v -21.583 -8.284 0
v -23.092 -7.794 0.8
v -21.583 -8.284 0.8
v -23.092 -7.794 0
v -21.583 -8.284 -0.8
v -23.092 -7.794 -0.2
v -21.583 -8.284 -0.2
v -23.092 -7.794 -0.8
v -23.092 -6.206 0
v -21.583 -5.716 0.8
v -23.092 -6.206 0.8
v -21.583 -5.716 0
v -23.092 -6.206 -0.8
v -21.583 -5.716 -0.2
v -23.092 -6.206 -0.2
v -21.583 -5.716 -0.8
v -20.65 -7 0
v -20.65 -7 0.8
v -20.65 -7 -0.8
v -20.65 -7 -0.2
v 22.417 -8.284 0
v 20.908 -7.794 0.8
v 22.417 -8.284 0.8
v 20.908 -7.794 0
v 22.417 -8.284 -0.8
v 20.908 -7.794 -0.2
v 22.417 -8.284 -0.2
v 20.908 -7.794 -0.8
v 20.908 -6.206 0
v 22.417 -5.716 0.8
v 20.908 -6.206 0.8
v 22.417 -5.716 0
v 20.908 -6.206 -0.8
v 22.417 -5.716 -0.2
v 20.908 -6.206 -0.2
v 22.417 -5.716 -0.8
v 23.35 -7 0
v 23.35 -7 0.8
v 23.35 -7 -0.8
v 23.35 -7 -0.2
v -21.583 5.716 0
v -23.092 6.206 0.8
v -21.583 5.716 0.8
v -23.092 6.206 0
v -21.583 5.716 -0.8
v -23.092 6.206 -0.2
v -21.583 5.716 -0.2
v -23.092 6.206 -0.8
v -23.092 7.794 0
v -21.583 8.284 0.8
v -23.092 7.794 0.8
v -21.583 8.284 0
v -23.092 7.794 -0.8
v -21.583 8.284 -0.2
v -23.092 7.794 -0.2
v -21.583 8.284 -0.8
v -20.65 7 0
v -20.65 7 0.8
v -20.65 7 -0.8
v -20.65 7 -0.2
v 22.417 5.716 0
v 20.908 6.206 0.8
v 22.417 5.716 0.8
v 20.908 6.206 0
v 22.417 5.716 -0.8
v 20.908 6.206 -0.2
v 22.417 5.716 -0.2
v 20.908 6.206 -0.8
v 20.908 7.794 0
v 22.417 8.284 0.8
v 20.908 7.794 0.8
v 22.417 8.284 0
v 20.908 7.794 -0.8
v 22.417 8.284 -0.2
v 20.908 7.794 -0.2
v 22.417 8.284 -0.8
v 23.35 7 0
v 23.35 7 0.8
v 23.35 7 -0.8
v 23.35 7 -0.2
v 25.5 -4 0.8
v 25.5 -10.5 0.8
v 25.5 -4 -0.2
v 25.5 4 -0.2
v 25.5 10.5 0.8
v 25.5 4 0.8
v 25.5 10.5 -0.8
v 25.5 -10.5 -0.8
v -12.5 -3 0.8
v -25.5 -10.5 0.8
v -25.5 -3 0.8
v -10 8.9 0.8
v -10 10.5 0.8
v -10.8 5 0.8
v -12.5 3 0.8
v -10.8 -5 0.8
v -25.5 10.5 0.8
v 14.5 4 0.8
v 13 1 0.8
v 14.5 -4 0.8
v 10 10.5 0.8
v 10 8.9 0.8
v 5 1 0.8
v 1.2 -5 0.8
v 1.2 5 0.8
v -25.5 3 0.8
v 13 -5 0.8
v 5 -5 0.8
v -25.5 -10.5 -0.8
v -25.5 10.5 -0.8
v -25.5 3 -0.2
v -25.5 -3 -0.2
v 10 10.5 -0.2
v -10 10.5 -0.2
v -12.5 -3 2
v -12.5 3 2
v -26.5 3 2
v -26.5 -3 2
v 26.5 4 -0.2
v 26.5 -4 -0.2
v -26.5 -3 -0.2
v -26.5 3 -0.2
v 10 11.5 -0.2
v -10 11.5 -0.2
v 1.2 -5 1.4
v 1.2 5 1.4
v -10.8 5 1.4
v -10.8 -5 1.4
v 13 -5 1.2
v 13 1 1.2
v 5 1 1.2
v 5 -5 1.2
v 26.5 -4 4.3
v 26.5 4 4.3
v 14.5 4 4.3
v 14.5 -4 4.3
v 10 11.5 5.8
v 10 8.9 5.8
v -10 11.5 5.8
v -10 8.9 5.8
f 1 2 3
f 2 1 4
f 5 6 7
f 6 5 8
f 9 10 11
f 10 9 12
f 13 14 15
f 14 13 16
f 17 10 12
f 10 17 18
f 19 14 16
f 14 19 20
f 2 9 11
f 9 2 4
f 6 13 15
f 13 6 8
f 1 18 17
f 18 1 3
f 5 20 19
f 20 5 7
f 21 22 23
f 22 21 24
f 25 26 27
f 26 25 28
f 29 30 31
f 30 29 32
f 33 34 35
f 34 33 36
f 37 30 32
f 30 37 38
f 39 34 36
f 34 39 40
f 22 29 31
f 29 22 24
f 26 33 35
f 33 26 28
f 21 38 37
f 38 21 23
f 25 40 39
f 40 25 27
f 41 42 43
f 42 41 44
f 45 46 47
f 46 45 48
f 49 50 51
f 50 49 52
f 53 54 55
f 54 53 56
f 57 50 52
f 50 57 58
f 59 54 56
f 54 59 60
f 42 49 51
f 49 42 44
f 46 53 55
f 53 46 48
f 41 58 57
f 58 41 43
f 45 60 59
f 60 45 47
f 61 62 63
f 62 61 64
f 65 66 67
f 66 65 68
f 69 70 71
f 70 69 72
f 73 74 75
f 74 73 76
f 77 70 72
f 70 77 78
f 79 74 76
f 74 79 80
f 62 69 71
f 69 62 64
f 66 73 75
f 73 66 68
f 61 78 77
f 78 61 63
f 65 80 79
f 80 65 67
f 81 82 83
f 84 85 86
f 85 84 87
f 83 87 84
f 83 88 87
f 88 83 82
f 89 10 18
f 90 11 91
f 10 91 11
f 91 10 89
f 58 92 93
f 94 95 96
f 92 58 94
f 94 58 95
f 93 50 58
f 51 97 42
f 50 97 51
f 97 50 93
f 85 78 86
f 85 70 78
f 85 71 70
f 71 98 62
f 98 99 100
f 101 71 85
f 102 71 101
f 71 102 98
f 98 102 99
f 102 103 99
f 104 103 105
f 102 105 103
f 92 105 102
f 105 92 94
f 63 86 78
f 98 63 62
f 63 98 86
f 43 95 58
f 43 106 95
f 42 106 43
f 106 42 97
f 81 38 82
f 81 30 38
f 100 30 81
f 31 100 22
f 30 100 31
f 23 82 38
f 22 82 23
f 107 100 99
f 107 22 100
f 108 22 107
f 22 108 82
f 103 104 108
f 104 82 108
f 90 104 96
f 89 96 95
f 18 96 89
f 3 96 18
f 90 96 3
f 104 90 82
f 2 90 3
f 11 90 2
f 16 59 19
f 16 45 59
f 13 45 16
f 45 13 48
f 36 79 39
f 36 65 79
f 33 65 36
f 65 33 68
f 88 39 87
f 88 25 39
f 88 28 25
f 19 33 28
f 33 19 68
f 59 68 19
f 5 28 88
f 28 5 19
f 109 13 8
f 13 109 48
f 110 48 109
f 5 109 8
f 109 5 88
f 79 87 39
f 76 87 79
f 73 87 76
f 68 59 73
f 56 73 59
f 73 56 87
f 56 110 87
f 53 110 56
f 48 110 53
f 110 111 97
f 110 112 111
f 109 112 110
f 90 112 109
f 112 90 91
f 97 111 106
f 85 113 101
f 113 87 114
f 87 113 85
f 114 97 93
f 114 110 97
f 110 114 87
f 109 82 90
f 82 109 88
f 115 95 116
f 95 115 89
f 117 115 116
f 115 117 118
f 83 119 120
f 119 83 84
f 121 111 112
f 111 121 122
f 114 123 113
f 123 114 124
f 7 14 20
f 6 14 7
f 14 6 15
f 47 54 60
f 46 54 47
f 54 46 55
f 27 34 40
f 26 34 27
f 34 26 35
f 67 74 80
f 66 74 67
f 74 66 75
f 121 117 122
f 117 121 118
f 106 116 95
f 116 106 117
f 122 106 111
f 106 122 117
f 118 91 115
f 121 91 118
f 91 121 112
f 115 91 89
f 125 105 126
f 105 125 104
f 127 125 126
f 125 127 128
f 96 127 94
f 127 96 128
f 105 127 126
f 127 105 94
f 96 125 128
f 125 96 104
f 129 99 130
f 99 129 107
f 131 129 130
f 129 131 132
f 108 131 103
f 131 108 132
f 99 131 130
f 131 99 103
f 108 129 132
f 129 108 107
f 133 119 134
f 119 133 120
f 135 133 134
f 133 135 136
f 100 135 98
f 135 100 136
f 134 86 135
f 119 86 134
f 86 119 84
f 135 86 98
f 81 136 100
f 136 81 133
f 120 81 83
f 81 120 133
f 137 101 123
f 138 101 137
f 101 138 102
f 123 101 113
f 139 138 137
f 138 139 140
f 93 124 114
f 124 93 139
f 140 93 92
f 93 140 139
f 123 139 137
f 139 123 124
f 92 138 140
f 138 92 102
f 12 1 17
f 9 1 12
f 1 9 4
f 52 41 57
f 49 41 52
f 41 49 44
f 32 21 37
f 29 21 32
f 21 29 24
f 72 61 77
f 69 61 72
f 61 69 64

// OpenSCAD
// Parameters
pcb_length = 51; //[25.5:102:0.1]
pcb_width = 21; //[10.5:42:0.1]
pcb_thickness = 1.6; //[0.8:3.2:0.1]
overlap = 1; //[0.5:2:0.1]
mount_hole_diameter = 2.7; //[2:4:0.1]
mount_hole_edge_offset_x = 3.5; //[2:7:0.1]
mount_hole_edge_offset_y = 3.5; //[2:7:0.1]
edge_connector_length = 14; //[7:28:0.1]
edge_connector_width = 6; //[3:12:0.1]
edge_connector_height = 2.2; //[1:5:0.1]
ic1_length = 12; //[6:24:0.1]
ic1_width = 10; //[5:20:0.1]
ic1_height = 1.6; //[0.8:4:0.1]
ic2_length = 8; //[4:16:0.1]
ic2_width = 6; //[3:12:0.1]
ic2_height = 1.4; //[0.7:3.5:0.1]
usb_length = 12; //[6:24:0.1]
usb_width = 8; //[4:16:0.1]
usb_height = 4.5; //[2:10:0.1]
header_length = 20; //[10:40:0.1]
header_width = 2.6; //[1.5:6:0.1]
header_height = 6; //[3:12:0.1]
silkscreen_thickness = 0.2; //[0.1:0.5:0.05]
silkscreen_margin = 1.2; //[0.6:3:0.1]

// PCB Main Body
module pcb_main_body() {
  color([0.0, 0.4, 0.2]) // Green PCB
  cube([pcb_length, pcb_width, pcb_thickness], center=true);
}

// Mounting Holes
module mount_hole() {
  cylinder(h=pcb_thickness + 2*overlap, r=mount_hole_diameter/2, center=true);
}

module mounting_holes() {
  union() {
    translate([-pcb_length/2 + mount_hole_edge_offset_x, -pcb_width/2 + mount_hole_edge_offset_y, 0]) mount_hole();
    translate([pcb_length/2 - mount_hole_edge_offset_x, -pcb_width/2 + mount_hole_edge_offset_y, 0]) mount_hole();
    translate([-pcb_length/2 + mount_hole_edge_offset_x, pcb_width/2 - mount_hole_edge_offset_y, 0]) mount_hole();
    translate([pcb_length/2 - mount_hole_edge_offset_x, pcb_width/2 - mount_hole_edge_offset_y, 0]) mount_hole();
  }
}

// PCB with Holes
module pcb_with_holes() {
  difference() {
    pcb_main_body();
    mounting_holes();
  }
}

// Edge Connectors
module edge_connectors() {
  color([0.85, 0.85, 0.8]) // Off-white
  translate([-pcb_length/2 + edge_connector_length/2 - overlap, 0, pcb_thickness/2 + edge_connector_height/2 - overlap])
    cube([edge_connector_length, edge_connector_width, edge_connector_height], center=true);
}

// IC Package 1
module ic_package_1() {
  color([0.1, 0.1, 0.12]) // Black
  translate([-pcb_length/2 + mount_hole_edge_offset_x + ic1_length/2 + (pcb_length - 2*mount_hole_edge_offset_x - ic1_length)*0.35, 0, pcb_thickness/2 + ic1_height/2 - overlap])
    cube([ic1_length, ic1_width, ic1_height], center=true);
}

// IC Package 2
module ic_package_2() {
  color([0.1, 0.1, 0.12]) // Black
  translate([pcb_length/2 - mount_hole_edge_offset_x - ic2_length/2 - (pcb_length - 2*mount_hole_edge_offset_x - ic2_length)*0.25, -pcb_width/2 + mount_hole_edge_offset_y + ic2_width/2 + (pcb_width - 2*mount_hole_edge_offset_y - ic2_width)*0.25, pcb_thickness/2 + ic2_height/2 - overlap])
    cube([ic2_length, ic2_width, ic2_height], center=true);
}

// USB Connector
module usb_connector() {
  color([0.15, 0.15, 0.17]) // Dark Gray
  translate([pcb_length/2 - usb_length/2 + overlap, 0, pcb_thickness/2 + usb_height/2 - overlap])
    cube([usb_length, usb_width, usb_height], center=true);
}

// Pin Headers
module pin_headers() {
  color([0.2, 0.2, 0.2]) // Dark Gray
  translate([0, pcb_width/2 - header_width/2 + overlap, pcb_thickness/2 + header_height/2 - overlap])
    cube([header_length, header_width, header_height], center=true);
}

// Silkscreen Markings
module silkscreen_markings() {
  color([0.85, 0.85, 0.8]) // Off-white
  translate([0, 0, pcb_thickness/2 + silkscreen_thickness/2 - overlap])
    cube([pcb_length - 2*silkscreen_margin, pcb_width - 2*silkscreen_margin, silkscreen_thickness], center=true);
}

// Complete Model
module complete_model() {
  union() {
    pcb_with_holes();
    edge_connectors();
    ic_package_1();
    ic_package_2();
    usb_connector();
    pin_headers();
    silkscreen_markings();
  }
}

// Render the complete model
complete_model();
